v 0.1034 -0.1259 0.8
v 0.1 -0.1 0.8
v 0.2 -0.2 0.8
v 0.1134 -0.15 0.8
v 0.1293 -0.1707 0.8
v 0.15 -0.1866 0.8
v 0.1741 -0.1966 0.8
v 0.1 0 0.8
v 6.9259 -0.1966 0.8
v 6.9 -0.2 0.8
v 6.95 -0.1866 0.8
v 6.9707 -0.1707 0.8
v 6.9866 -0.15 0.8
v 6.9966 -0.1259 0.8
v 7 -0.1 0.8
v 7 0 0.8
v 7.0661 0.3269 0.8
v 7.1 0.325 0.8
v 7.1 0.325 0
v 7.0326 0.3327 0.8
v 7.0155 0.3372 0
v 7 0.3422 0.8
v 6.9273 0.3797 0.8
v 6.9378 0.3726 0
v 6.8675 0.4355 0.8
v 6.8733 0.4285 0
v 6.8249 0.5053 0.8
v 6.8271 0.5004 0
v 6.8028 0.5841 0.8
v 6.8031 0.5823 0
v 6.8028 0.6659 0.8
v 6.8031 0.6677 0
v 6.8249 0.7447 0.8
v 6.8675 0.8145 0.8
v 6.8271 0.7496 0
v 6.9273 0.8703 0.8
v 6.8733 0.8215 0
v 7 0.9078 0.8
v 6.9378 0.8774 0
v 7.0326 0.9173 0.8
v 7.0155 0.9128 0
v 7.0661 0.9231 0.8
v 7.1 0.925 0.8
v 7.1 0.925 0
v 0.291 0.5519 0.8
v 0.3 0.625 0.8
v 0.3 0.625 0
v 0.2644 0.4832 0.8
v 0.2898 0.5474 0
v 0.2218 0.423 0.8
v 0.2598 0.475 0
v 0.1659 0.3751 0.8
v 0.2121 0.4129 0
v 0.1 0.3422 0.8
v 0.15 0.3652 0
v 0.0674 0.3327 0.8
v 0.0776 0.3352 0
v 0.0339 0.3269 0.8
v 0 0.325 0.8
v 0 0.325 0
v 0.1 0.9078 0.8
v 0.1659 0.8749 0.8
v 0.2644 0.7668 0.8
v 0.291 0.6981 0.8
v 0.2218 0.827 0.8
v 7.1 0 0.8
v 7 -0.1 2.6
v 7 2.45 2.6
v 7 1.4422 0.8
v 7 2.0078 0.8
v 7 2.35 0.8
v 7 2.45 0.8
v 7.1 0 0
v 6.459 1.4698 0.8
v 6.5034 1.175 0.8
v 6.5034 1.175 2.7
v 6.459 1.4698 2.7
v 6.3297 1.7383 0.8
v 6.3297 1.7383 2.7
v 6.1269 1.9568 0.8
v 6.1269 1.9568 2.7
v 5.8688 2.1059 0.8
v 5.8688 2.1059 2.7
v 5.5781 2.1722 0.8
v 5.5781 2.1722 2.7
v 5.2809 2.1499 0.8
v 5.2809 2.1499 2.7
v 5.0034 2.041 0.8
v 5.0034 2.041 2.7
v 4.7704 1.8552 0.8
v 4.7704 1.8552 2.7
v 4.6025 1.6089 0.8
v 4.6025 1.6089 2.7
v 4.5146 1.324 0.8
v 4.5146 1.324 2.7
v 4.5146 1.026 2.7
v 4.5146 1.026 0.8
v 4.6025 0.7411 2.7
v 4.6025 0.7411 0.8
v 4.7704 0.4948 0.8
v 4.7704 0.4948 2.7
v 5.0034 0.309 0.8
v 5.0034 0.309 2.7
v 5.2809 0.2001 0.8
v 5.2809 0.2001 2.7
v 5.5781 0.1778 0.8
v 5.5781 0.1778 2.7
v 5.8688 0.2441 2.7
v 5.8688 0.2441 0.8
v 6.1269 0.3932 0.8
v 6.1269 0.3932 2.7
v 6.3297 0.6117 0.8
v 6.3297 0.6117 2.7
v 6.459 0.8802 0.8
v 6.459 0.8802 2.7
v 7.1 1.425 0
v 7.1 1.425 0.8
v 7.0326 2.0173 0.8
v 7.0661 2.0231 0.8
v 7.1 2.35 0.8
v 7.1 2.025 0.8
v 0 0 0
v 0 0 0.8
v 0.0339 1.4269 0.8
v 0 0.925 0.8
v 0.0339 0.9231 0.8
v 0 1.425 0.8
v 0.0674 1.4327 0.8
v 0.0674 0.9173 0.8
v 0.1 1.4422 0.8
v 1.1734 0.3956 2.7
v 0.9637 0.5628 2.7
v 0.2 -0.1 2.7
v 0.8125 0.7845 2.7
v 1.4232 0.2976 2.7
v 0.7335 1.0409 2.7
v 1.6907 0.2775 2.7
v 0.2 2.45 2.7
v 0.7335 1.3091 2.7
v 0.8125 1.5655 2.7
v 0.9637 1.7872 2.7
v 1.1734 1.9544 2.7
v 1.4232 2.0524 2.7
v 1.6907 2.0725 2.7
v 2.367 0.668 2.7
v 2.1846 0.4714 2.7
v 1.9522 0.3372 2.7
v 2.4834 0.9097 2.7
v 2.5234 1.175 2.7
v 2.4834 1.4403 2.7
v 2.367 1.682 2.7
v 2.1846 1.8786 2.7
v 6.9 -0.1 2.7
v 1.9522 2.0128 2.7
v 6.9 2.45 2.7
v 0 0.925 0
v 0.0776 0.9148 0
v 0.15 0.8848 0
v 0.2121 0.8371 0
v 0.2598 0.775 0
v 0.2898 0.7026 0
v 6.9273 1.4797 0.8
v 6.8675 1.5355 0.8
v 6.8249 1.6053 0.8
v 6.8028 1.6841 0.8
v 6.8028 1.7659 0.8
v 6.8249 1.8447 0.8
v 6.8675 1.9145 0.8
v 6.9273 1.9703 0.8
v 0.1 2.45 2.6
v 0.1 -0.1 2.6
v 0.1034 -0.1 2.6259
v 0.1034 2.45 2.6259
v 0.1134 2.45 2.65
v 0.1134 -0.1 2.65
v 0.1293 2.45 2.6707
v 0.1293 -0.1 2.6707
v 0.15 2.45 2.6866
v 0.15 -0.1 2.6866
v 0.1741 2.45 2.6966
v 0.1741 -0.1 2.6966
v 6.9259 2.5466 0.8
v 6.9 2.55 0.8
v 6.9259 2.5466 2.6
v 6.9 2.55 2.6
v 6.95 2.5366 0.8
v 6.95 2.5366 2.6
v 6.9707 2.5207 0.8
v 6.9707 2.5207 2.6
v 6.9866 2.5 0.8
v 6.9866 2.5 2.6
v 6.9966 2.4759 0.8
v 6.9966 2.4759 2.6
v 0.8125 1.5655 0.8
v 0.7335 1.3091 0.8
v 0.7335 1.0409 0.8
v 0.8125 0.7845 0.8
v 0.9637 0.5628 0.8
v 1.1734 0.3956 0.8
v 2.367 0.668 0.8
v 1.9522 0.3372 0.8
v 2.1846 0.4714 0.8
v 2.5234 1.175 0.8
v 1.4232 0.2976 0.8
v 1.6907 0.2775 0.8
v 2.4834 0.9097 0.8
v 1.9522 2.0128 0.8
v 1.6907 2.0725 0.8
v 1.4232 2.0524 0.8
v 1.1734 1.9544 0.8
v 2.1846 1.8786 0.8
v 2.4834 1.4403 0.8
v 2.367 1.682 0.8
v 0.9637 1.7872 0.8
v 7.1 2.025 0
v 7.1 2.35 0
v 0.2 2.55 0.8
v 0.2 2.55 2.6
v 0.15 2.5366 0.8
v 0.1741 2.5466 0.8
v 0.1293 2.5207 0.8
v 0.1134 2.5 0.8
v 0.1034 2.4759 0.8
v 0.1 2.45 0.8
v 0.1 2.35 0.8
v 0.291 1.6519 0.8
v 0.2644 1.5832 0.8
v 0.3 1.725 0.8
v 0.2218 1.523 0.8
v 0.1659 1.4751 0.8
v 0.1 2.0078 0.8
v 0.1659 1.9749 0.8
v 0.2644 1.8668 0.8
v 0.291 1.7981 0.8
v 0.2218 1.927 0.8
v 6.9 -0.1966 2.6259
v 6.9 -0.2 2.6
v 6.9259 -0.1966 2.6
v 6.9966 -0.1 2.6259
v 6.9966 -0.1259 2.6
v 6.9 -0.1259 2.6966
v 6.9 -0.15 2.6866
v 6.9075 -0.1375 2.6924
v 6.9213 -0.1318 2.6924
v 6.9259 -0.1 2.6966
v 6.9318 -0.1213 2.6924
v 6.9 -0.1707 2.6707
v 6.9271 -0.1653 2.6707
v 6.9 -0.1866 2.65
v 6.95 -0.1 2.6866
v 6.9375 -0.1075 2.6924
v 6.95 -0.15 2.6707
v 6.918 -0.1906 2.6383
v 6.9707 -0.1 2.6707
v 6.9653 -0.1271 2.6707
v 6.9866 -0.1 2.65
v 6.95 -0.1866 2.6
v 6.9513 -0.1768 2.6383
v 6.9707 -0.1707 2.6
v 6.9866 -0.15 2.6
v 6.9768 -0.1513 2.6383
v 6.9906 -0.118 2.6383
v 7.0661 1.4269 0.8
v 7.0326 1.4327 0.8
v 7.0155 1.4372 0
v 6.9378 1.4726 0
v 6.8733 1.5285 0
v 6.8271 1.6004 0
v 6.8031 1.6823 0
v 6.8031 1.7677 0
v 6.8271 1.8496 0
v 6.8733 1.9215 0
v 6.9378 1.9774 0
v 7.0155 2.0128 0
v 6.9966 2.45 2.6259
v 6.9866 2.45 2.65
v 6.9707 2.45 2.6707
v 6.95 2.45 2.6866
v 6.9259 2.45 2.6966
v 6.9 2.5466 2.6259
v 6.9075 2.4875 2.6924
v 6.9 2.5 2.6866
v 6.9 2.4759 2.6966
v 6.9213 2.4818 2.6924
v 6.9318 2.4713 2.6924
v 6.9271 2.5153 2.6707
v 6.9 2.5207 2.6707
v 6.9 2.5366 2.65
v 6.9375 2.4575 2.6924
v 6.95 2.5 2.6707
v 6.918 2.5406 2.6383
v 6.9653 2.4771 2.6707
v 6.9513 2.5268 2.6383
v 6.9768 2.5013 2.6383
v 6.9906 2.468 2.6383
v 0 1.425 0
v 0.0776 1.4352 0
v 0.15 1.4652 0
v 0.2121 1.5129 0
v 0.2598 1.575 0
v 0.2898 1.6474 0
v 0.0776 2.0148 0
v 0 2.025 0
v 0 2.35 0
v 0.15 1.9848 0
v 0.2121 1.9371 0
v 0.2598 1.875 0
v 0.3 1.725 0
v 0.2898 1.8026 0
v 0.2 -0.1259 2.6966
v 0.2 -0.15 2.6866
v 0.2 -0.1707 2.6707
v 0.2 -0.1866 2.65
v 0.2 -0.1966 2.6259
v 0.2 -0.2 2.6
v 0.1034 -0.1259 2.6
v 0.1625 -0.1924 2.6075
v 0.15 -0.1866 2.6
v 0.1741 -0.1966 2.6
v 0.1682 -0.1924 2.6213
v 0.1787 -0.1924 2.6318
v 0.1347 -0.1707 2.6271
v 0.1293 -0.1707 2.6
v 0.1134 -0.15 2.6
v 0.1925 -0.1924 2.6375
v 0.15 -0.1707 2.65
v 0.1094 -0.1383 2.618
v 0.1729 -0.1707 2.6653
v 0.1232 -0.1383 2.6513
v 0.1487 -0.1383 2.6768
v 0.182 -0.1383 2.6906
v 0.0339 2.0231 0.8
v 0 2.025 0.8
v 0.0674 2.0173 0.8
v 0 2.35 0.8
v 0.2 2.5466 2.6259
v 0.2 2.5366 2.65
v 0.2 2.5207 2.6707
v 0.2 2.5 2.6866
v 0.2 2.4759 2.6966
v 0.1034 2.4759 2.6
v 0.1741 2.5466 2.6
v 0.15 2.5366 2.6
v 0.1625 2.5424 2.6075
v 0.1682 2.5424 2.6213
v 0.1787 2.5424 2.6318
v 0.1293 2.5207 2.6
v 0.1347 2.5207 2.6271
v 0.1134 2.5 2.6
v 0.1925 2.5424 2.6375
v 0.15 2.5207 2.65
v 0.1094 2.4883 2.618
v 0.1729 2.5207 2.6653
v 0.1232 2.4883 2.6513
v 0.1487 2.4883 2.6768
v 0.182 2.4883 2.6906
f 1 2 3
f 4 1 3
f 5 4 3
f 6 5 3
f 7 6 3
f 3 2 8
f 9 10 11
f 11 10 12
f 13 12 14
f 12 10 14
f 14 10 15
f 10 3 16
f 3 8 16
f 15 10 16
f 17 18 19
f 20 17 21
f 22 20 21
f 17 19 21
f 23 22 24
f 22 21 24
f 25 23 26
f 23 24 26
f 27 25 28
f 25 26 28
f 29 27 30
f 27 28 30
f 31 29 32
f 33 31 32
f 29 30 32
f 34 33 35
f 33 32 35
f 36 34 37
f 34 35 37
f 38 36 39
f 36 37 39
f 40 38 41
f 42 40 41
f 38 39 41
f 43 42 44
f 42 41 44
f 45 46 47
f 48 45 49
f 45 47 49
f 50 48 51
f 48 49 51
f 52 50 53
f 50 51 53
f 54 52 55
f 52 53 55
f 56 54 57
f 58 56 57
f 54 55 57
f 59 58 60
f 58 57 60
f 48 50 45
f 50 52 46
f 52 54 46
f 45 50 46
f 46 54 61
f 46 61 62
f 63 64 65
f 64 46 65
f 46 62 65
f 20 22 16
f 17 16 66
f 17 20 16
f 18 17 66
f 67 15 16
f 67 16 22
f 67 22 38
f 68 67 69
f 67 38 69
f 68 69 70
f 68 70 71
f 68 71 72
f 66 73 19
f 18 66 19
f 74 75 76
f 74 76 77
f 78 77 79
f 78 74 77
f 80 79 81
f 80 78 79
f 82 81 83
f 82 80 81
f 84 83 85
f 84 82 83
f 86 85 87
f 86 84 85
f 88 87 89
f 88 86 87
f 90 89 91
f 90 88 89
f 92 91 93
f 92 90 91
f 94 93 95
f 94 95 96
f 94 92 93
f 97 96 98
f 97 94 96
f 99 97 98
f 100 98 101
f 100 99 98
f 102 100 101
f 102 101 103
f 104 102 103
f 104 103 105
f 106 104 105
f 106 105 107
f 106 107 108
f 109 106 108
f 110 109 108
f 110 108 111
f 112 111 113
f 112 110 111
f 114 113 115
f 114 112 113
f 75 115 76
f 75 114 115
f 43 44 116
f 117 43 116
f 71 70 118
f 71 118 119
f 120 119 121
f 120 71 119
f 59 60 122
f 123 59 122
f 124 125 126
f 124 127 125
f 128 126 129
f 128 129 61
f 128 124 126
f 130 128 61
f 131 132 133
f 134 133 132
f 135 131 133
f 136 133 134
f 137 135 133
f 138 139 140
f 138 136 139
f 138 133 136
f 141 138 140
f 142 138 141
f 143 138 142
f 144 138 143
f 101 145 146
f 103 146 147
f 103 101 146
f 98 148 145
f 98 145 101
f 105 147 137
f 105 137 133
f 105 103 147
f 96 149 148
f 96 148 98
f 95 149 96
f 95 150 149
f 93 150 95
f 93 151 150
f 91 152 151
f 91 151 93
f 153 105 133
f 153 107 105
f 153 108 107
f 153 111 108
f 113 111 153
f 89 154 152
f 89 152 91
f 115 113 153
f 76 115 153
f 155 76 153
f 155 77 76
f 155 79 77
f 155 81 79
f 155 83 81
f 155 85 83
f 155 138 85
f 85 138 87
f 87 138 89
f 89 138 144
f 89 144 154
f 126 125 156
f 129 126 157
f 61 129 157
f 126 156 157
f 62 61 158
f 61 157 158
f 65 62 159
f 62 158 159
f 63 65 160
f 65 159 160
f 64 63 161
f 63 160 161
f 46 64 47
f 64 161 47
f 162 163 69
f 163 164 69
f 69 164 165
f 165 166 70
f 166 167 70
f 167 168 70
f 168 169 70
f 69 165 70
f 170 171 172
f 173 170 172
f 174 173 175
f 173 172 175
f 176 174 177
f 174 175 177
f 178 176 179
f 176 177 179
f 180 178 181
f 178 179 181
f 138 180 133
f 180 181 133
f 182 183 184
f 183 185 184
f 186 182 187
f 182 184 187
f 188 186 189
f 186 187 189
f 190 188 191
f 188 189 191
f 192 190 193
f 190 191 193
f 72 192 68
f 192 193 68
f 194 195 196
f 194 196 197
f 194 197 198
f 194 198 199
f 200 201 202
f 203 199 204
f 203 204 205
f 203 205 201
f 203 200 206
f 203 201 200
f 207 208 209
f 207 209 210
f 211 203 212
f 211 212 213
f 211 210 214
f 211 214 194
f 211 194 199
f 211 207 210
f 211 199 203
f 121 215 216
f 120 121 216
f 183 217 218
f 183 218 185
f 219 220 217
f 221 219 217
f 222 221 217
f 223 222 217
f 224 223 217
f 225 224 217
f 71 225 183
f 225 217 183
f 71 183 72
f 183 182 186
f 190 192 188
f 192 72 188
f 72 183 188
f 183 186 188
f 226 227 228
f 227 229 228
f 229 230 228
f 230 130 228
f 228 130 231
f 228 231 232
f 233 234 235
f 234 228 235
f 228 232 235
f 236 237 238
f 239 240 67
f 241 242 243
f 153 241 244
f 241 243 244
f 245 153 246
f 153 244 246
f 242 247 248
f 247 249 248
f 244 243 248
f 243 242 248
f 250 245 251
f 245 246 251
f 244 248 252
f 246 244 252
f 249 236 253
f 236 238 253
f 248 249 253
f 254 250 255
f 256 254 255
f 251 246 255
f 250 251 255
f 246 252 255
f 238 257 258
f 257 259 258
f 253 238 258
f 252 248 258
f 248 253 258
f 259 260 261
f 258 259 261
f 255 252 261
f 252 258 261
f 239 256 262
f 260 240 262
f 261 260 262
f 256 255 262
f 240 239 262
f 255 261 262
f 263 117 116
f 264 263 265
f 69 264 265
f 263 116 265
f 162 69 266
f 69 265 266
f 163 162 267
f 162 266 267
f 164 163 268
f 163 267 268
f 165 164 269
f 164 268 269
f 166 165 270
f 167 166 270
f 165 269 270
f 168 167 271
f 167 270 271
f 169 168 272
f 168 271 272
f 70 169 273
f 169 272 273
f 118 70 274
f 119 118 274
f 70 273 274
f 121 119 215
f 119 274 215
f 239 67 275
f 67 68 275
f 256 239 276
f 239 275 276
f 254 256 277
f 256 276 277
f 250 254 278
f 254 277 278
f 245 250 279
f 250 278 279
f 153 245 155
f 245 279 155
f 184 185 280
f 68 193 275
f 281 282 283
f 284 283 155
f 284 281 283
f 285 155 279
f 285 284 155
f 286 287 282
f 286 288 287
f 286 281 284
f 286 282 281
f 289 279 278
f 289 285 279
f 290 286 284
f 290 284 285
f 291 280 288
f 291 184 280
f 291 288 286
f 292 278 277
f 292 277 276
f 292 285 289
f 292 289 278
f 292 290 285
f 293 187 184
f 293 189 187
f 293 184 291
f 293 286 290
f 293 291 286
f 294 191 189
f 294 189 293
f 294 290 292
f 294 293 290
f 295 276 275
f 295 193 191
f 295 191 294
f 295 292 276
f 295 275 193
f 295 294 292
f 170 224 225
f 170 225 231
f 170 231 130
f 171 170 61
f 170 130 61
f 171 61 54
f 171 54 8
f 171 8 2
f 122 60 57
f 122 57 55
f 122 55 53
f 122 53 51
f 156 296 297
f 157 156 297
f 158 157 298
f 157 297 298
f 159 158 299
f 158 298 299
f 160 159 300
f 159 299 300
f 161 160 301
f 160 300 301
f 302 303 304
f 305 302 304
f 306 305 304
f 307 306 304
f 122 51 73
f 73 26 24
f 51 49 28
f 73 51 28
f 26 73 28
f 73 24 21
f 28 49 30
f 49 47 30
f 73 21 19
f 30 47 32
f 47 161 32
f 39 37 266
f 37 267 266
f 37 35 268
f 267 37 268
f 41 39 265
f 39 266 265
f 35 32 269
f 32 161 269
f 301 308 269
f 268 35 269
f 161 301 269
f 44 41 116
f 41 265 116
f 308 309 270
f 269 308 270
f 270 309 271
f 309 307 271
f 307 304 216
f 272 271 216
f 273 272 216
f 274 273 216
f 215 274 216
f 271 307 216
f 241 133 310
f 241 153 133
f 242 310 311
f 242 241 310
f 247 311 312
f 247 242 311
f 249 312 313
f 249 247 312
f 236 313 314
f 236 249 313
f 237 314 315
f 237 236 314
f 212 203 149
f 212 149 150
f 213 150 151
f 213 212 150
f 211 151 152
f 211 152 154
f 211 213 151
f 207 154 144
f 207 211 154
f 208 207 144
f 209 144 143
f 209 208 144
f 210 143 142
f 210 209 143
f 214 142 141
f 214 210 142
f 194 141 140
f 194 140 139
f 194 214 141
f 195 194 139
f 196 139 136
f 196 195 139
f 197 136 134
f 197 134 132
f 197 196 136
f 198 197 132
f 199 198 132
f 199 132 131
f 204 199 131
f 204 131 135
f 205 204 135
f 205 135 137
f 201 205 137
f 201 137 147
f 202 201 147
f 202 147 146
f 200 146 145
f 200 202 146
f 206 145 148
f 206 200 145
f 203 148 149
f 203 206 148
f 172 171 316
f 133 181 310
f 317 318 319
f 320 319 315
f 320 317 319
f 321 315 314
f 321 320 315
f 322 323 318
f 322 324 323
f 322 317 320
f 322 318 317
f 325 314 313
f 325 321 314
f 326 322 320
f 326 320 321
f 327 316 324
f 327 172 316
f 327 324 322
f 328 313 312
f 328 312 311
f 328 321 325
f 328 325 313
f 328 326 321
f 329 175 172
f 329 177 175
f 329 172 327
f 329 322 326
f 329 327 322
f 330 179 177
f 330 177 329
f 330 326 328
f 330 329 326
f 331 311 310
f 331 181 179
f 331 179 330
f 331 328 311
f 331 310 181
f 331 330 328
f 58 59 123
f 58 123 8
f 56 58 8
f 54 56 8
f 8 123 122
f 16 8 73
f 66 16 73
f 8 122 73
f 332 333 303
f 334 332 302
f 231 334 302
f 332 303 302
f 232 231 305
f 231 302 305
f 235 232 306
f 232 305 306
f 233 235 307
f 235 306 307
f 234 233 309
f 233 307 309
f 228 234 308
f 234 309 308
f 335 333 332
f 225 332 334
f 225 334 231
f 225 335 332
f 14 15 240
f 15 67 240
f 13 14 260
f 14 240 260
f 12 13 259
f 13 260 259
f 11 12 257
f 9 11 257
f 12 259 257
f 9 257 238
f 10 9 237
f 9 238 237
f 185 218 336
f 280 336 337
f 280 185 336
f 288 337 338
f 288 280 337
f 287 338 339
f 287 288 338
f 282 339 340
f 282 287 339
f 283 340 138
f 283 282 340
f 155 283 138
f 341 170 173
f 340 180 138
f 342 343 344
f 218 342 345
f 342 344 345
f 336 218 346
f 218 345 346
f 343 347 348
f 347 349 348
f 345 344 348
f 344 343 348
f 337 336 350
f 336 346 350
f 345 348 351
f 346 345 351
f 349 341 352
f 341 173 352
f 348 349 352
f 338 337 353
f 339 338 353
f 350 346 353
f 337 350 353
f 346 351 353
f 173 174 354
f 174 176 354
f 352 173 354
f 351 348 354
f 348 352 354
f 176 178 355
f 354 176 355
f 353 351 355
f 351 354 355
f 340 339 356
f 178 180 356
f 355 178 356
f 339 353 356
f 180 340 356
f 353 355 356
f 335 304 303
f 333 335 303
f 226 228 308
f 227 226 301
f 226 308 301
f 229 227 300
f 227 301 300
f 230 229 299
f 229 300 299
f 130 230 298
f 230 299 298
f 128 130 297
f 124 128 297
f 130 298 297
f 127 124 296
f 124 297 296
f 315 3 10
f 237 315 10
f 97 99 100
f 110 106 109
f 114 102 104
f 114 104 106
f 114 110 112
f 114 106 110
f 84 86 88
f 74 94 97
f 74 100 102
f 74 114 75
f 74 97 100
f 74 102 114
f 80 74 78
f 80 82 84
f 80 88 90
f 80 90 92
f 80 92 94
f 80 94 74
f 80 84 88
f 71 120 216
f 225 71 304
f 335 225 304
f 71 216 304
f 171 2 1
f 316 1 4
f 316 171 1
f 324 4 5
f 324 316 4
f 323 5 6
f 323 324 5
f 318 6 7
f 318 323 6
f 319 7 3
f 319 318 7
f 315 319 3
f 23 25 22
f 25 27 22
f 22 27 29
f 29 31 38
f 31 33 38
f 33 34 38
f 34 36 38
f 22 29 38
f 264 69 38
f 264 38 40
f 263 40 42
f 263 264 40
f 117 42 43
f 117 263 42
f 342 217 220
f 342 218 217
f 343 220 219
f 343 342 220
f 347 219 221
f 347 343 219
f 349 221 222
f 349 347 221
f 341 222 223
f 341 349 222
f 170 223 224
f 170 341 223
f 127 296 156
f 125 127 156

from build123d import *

# Parameters (mm, degrees)
F1_DEPTH = 0.8
F2_R     = 0.9
F2_R_2   = 1
F2_W     = 6.9
F2_H     = 0.2
F3_DEPTH = 1.9
F4_R     = 0.1


with BuildPart() as f1:
    # F0 (on Top) → F1 (new body)
    with BuildSketch(Plane.XY):
        with BuildLine():
            Line((0, 0.325), (0, 0))
            Line((0, 0), (7.1, 0))
            Line((7.1, 0), (7.1, 0.325))
            ThreePointArc((7.1, 0.325), (6.8, 0.625), (7.1, 0.925))
            Line((7.1, 0.925), (7.1, 1.425))
            ThreePointArc((7.1, 1.425), (6.8, 1.725), (7.1, 2.025))
            Line((7.1, 2.025), (7.1, 2.35))
            Line((7.1, 2.35), (0, 2.35))
            Line((0, 2.35), (0, 2.025))
            ThreePointArc((0, 2.025), (0.2121320344, 1.9371320344), (0.3, 1.725))
            ThreePointArc((0.3, 1.725), (0.2121320344, 1.5128679656), (0, 1.425))
            Line((0, 1.425), (0, 0.925))
            ThreePointArc((0, 0.925), (0.2121320344, 0.8371320344), (0.3, 0.625))
            ThreePointArc((0.3, 0.625), (0.2121320344, 0.4128679656), (0, 0.325))
        make_face()
    extrude(amount=F1_DEPTH)

    # F2 (on face) → F3 (join)
    with BuildSketch(Plane.XY.offset(0.8)):
        with BuildLine():
            Line((7, 2.35), (0.1, 2.35))
            Line((0.1, 2.35), (0.1, 2.0078427125))
            ThreePointArc((0.1, 2.0078427125), (0.3, 1.725), (0.1, 1.4421572875))
            Line((0.1, 1.4421572875), (0.1, 0.9078427125))
            ThreePointArc((0.1, 0.9078427125), (0.3, 0.625), (0.1, 0.3421572875))
            Line((0.1, 0.3421572875), (0.1, 0))
            Line((0.1, 0), (7, 0))
            Line((7, 0), (7, 0.3421572875))
            ThreePointArc((7, 0.3421572875), (6.8, 0.625), (7, 0.9078427125))
            Line((7, 0.9078427125), (7, 1.4421572875))
            ThreePointArc((7, 1.4421572875), (6.8, 1.725), (7, 2.0078427125))
            Line((7, 2.0078427125), (7, 2.35))
        make_face()
        with Locations((1.6234196955, 1.175)):
            Circle(F2_R, mode=Mode.SUBTRACT)
        with Locations((5.5034196955, 1.175)):
            Circle(F2_R_2, mode=Mode.SUBTRACT)
        with Locations((3.55, 2.45)):
            Rectangle(F2_W, F2_H)
        with Locations((3.55, -0.1)):
            Rectangle(F2_W, F2_H)
        with BuildLine():
            ThreePointArc((0.1, 0.3421572875), (0.3, 0.625), (0.1, 0.9078427125))
            Line((0.1, 0.9078427125), (0.1, 0.3421572875))
        make_face()
        with BuildLine():
            ThreePointArc((0.1, 1.4421572875), (0.3, 1.725), (0.1, 2.0078427125))
            Line((0.1, 2.0078427125), (0.1, 1.4421572875))
        make_face()
        with BuildLine():
            Line((7, 1.4421572875), (7, 2.0078427125))
            ThreePointArc((7, 2.0078427125), (6.8, 1.725), (7, 1.4421572875))
        make_face()
        with BuildLine():
            Line((7, 0.3421572875), (7, 0.9078427125))
            ThreePointArc((7, 0.9078427125), (6.8, 0.625), (7, 0.3421572875))
        make_face()
    extrude(amount=F3_DEPTH)

    # F4
    f4_edges = [f1.edges().sort_by_distance(p)[0] for p in [
        (0.1, 1.175, 2.7),
        (0.1, -0.2, 1.75),
        (0.1, 2.55, 1.75),
        (7, -0.2, 1.75),
        (7, 2.55, 1.75),
        (3.55, 2.55, 2.7),
        (3.55, -0.2, 2.7),
        (7, 1.175, 2.7),
    ]]
    fillet(f4_edges, radius=F4_R)


solid = f1.part
